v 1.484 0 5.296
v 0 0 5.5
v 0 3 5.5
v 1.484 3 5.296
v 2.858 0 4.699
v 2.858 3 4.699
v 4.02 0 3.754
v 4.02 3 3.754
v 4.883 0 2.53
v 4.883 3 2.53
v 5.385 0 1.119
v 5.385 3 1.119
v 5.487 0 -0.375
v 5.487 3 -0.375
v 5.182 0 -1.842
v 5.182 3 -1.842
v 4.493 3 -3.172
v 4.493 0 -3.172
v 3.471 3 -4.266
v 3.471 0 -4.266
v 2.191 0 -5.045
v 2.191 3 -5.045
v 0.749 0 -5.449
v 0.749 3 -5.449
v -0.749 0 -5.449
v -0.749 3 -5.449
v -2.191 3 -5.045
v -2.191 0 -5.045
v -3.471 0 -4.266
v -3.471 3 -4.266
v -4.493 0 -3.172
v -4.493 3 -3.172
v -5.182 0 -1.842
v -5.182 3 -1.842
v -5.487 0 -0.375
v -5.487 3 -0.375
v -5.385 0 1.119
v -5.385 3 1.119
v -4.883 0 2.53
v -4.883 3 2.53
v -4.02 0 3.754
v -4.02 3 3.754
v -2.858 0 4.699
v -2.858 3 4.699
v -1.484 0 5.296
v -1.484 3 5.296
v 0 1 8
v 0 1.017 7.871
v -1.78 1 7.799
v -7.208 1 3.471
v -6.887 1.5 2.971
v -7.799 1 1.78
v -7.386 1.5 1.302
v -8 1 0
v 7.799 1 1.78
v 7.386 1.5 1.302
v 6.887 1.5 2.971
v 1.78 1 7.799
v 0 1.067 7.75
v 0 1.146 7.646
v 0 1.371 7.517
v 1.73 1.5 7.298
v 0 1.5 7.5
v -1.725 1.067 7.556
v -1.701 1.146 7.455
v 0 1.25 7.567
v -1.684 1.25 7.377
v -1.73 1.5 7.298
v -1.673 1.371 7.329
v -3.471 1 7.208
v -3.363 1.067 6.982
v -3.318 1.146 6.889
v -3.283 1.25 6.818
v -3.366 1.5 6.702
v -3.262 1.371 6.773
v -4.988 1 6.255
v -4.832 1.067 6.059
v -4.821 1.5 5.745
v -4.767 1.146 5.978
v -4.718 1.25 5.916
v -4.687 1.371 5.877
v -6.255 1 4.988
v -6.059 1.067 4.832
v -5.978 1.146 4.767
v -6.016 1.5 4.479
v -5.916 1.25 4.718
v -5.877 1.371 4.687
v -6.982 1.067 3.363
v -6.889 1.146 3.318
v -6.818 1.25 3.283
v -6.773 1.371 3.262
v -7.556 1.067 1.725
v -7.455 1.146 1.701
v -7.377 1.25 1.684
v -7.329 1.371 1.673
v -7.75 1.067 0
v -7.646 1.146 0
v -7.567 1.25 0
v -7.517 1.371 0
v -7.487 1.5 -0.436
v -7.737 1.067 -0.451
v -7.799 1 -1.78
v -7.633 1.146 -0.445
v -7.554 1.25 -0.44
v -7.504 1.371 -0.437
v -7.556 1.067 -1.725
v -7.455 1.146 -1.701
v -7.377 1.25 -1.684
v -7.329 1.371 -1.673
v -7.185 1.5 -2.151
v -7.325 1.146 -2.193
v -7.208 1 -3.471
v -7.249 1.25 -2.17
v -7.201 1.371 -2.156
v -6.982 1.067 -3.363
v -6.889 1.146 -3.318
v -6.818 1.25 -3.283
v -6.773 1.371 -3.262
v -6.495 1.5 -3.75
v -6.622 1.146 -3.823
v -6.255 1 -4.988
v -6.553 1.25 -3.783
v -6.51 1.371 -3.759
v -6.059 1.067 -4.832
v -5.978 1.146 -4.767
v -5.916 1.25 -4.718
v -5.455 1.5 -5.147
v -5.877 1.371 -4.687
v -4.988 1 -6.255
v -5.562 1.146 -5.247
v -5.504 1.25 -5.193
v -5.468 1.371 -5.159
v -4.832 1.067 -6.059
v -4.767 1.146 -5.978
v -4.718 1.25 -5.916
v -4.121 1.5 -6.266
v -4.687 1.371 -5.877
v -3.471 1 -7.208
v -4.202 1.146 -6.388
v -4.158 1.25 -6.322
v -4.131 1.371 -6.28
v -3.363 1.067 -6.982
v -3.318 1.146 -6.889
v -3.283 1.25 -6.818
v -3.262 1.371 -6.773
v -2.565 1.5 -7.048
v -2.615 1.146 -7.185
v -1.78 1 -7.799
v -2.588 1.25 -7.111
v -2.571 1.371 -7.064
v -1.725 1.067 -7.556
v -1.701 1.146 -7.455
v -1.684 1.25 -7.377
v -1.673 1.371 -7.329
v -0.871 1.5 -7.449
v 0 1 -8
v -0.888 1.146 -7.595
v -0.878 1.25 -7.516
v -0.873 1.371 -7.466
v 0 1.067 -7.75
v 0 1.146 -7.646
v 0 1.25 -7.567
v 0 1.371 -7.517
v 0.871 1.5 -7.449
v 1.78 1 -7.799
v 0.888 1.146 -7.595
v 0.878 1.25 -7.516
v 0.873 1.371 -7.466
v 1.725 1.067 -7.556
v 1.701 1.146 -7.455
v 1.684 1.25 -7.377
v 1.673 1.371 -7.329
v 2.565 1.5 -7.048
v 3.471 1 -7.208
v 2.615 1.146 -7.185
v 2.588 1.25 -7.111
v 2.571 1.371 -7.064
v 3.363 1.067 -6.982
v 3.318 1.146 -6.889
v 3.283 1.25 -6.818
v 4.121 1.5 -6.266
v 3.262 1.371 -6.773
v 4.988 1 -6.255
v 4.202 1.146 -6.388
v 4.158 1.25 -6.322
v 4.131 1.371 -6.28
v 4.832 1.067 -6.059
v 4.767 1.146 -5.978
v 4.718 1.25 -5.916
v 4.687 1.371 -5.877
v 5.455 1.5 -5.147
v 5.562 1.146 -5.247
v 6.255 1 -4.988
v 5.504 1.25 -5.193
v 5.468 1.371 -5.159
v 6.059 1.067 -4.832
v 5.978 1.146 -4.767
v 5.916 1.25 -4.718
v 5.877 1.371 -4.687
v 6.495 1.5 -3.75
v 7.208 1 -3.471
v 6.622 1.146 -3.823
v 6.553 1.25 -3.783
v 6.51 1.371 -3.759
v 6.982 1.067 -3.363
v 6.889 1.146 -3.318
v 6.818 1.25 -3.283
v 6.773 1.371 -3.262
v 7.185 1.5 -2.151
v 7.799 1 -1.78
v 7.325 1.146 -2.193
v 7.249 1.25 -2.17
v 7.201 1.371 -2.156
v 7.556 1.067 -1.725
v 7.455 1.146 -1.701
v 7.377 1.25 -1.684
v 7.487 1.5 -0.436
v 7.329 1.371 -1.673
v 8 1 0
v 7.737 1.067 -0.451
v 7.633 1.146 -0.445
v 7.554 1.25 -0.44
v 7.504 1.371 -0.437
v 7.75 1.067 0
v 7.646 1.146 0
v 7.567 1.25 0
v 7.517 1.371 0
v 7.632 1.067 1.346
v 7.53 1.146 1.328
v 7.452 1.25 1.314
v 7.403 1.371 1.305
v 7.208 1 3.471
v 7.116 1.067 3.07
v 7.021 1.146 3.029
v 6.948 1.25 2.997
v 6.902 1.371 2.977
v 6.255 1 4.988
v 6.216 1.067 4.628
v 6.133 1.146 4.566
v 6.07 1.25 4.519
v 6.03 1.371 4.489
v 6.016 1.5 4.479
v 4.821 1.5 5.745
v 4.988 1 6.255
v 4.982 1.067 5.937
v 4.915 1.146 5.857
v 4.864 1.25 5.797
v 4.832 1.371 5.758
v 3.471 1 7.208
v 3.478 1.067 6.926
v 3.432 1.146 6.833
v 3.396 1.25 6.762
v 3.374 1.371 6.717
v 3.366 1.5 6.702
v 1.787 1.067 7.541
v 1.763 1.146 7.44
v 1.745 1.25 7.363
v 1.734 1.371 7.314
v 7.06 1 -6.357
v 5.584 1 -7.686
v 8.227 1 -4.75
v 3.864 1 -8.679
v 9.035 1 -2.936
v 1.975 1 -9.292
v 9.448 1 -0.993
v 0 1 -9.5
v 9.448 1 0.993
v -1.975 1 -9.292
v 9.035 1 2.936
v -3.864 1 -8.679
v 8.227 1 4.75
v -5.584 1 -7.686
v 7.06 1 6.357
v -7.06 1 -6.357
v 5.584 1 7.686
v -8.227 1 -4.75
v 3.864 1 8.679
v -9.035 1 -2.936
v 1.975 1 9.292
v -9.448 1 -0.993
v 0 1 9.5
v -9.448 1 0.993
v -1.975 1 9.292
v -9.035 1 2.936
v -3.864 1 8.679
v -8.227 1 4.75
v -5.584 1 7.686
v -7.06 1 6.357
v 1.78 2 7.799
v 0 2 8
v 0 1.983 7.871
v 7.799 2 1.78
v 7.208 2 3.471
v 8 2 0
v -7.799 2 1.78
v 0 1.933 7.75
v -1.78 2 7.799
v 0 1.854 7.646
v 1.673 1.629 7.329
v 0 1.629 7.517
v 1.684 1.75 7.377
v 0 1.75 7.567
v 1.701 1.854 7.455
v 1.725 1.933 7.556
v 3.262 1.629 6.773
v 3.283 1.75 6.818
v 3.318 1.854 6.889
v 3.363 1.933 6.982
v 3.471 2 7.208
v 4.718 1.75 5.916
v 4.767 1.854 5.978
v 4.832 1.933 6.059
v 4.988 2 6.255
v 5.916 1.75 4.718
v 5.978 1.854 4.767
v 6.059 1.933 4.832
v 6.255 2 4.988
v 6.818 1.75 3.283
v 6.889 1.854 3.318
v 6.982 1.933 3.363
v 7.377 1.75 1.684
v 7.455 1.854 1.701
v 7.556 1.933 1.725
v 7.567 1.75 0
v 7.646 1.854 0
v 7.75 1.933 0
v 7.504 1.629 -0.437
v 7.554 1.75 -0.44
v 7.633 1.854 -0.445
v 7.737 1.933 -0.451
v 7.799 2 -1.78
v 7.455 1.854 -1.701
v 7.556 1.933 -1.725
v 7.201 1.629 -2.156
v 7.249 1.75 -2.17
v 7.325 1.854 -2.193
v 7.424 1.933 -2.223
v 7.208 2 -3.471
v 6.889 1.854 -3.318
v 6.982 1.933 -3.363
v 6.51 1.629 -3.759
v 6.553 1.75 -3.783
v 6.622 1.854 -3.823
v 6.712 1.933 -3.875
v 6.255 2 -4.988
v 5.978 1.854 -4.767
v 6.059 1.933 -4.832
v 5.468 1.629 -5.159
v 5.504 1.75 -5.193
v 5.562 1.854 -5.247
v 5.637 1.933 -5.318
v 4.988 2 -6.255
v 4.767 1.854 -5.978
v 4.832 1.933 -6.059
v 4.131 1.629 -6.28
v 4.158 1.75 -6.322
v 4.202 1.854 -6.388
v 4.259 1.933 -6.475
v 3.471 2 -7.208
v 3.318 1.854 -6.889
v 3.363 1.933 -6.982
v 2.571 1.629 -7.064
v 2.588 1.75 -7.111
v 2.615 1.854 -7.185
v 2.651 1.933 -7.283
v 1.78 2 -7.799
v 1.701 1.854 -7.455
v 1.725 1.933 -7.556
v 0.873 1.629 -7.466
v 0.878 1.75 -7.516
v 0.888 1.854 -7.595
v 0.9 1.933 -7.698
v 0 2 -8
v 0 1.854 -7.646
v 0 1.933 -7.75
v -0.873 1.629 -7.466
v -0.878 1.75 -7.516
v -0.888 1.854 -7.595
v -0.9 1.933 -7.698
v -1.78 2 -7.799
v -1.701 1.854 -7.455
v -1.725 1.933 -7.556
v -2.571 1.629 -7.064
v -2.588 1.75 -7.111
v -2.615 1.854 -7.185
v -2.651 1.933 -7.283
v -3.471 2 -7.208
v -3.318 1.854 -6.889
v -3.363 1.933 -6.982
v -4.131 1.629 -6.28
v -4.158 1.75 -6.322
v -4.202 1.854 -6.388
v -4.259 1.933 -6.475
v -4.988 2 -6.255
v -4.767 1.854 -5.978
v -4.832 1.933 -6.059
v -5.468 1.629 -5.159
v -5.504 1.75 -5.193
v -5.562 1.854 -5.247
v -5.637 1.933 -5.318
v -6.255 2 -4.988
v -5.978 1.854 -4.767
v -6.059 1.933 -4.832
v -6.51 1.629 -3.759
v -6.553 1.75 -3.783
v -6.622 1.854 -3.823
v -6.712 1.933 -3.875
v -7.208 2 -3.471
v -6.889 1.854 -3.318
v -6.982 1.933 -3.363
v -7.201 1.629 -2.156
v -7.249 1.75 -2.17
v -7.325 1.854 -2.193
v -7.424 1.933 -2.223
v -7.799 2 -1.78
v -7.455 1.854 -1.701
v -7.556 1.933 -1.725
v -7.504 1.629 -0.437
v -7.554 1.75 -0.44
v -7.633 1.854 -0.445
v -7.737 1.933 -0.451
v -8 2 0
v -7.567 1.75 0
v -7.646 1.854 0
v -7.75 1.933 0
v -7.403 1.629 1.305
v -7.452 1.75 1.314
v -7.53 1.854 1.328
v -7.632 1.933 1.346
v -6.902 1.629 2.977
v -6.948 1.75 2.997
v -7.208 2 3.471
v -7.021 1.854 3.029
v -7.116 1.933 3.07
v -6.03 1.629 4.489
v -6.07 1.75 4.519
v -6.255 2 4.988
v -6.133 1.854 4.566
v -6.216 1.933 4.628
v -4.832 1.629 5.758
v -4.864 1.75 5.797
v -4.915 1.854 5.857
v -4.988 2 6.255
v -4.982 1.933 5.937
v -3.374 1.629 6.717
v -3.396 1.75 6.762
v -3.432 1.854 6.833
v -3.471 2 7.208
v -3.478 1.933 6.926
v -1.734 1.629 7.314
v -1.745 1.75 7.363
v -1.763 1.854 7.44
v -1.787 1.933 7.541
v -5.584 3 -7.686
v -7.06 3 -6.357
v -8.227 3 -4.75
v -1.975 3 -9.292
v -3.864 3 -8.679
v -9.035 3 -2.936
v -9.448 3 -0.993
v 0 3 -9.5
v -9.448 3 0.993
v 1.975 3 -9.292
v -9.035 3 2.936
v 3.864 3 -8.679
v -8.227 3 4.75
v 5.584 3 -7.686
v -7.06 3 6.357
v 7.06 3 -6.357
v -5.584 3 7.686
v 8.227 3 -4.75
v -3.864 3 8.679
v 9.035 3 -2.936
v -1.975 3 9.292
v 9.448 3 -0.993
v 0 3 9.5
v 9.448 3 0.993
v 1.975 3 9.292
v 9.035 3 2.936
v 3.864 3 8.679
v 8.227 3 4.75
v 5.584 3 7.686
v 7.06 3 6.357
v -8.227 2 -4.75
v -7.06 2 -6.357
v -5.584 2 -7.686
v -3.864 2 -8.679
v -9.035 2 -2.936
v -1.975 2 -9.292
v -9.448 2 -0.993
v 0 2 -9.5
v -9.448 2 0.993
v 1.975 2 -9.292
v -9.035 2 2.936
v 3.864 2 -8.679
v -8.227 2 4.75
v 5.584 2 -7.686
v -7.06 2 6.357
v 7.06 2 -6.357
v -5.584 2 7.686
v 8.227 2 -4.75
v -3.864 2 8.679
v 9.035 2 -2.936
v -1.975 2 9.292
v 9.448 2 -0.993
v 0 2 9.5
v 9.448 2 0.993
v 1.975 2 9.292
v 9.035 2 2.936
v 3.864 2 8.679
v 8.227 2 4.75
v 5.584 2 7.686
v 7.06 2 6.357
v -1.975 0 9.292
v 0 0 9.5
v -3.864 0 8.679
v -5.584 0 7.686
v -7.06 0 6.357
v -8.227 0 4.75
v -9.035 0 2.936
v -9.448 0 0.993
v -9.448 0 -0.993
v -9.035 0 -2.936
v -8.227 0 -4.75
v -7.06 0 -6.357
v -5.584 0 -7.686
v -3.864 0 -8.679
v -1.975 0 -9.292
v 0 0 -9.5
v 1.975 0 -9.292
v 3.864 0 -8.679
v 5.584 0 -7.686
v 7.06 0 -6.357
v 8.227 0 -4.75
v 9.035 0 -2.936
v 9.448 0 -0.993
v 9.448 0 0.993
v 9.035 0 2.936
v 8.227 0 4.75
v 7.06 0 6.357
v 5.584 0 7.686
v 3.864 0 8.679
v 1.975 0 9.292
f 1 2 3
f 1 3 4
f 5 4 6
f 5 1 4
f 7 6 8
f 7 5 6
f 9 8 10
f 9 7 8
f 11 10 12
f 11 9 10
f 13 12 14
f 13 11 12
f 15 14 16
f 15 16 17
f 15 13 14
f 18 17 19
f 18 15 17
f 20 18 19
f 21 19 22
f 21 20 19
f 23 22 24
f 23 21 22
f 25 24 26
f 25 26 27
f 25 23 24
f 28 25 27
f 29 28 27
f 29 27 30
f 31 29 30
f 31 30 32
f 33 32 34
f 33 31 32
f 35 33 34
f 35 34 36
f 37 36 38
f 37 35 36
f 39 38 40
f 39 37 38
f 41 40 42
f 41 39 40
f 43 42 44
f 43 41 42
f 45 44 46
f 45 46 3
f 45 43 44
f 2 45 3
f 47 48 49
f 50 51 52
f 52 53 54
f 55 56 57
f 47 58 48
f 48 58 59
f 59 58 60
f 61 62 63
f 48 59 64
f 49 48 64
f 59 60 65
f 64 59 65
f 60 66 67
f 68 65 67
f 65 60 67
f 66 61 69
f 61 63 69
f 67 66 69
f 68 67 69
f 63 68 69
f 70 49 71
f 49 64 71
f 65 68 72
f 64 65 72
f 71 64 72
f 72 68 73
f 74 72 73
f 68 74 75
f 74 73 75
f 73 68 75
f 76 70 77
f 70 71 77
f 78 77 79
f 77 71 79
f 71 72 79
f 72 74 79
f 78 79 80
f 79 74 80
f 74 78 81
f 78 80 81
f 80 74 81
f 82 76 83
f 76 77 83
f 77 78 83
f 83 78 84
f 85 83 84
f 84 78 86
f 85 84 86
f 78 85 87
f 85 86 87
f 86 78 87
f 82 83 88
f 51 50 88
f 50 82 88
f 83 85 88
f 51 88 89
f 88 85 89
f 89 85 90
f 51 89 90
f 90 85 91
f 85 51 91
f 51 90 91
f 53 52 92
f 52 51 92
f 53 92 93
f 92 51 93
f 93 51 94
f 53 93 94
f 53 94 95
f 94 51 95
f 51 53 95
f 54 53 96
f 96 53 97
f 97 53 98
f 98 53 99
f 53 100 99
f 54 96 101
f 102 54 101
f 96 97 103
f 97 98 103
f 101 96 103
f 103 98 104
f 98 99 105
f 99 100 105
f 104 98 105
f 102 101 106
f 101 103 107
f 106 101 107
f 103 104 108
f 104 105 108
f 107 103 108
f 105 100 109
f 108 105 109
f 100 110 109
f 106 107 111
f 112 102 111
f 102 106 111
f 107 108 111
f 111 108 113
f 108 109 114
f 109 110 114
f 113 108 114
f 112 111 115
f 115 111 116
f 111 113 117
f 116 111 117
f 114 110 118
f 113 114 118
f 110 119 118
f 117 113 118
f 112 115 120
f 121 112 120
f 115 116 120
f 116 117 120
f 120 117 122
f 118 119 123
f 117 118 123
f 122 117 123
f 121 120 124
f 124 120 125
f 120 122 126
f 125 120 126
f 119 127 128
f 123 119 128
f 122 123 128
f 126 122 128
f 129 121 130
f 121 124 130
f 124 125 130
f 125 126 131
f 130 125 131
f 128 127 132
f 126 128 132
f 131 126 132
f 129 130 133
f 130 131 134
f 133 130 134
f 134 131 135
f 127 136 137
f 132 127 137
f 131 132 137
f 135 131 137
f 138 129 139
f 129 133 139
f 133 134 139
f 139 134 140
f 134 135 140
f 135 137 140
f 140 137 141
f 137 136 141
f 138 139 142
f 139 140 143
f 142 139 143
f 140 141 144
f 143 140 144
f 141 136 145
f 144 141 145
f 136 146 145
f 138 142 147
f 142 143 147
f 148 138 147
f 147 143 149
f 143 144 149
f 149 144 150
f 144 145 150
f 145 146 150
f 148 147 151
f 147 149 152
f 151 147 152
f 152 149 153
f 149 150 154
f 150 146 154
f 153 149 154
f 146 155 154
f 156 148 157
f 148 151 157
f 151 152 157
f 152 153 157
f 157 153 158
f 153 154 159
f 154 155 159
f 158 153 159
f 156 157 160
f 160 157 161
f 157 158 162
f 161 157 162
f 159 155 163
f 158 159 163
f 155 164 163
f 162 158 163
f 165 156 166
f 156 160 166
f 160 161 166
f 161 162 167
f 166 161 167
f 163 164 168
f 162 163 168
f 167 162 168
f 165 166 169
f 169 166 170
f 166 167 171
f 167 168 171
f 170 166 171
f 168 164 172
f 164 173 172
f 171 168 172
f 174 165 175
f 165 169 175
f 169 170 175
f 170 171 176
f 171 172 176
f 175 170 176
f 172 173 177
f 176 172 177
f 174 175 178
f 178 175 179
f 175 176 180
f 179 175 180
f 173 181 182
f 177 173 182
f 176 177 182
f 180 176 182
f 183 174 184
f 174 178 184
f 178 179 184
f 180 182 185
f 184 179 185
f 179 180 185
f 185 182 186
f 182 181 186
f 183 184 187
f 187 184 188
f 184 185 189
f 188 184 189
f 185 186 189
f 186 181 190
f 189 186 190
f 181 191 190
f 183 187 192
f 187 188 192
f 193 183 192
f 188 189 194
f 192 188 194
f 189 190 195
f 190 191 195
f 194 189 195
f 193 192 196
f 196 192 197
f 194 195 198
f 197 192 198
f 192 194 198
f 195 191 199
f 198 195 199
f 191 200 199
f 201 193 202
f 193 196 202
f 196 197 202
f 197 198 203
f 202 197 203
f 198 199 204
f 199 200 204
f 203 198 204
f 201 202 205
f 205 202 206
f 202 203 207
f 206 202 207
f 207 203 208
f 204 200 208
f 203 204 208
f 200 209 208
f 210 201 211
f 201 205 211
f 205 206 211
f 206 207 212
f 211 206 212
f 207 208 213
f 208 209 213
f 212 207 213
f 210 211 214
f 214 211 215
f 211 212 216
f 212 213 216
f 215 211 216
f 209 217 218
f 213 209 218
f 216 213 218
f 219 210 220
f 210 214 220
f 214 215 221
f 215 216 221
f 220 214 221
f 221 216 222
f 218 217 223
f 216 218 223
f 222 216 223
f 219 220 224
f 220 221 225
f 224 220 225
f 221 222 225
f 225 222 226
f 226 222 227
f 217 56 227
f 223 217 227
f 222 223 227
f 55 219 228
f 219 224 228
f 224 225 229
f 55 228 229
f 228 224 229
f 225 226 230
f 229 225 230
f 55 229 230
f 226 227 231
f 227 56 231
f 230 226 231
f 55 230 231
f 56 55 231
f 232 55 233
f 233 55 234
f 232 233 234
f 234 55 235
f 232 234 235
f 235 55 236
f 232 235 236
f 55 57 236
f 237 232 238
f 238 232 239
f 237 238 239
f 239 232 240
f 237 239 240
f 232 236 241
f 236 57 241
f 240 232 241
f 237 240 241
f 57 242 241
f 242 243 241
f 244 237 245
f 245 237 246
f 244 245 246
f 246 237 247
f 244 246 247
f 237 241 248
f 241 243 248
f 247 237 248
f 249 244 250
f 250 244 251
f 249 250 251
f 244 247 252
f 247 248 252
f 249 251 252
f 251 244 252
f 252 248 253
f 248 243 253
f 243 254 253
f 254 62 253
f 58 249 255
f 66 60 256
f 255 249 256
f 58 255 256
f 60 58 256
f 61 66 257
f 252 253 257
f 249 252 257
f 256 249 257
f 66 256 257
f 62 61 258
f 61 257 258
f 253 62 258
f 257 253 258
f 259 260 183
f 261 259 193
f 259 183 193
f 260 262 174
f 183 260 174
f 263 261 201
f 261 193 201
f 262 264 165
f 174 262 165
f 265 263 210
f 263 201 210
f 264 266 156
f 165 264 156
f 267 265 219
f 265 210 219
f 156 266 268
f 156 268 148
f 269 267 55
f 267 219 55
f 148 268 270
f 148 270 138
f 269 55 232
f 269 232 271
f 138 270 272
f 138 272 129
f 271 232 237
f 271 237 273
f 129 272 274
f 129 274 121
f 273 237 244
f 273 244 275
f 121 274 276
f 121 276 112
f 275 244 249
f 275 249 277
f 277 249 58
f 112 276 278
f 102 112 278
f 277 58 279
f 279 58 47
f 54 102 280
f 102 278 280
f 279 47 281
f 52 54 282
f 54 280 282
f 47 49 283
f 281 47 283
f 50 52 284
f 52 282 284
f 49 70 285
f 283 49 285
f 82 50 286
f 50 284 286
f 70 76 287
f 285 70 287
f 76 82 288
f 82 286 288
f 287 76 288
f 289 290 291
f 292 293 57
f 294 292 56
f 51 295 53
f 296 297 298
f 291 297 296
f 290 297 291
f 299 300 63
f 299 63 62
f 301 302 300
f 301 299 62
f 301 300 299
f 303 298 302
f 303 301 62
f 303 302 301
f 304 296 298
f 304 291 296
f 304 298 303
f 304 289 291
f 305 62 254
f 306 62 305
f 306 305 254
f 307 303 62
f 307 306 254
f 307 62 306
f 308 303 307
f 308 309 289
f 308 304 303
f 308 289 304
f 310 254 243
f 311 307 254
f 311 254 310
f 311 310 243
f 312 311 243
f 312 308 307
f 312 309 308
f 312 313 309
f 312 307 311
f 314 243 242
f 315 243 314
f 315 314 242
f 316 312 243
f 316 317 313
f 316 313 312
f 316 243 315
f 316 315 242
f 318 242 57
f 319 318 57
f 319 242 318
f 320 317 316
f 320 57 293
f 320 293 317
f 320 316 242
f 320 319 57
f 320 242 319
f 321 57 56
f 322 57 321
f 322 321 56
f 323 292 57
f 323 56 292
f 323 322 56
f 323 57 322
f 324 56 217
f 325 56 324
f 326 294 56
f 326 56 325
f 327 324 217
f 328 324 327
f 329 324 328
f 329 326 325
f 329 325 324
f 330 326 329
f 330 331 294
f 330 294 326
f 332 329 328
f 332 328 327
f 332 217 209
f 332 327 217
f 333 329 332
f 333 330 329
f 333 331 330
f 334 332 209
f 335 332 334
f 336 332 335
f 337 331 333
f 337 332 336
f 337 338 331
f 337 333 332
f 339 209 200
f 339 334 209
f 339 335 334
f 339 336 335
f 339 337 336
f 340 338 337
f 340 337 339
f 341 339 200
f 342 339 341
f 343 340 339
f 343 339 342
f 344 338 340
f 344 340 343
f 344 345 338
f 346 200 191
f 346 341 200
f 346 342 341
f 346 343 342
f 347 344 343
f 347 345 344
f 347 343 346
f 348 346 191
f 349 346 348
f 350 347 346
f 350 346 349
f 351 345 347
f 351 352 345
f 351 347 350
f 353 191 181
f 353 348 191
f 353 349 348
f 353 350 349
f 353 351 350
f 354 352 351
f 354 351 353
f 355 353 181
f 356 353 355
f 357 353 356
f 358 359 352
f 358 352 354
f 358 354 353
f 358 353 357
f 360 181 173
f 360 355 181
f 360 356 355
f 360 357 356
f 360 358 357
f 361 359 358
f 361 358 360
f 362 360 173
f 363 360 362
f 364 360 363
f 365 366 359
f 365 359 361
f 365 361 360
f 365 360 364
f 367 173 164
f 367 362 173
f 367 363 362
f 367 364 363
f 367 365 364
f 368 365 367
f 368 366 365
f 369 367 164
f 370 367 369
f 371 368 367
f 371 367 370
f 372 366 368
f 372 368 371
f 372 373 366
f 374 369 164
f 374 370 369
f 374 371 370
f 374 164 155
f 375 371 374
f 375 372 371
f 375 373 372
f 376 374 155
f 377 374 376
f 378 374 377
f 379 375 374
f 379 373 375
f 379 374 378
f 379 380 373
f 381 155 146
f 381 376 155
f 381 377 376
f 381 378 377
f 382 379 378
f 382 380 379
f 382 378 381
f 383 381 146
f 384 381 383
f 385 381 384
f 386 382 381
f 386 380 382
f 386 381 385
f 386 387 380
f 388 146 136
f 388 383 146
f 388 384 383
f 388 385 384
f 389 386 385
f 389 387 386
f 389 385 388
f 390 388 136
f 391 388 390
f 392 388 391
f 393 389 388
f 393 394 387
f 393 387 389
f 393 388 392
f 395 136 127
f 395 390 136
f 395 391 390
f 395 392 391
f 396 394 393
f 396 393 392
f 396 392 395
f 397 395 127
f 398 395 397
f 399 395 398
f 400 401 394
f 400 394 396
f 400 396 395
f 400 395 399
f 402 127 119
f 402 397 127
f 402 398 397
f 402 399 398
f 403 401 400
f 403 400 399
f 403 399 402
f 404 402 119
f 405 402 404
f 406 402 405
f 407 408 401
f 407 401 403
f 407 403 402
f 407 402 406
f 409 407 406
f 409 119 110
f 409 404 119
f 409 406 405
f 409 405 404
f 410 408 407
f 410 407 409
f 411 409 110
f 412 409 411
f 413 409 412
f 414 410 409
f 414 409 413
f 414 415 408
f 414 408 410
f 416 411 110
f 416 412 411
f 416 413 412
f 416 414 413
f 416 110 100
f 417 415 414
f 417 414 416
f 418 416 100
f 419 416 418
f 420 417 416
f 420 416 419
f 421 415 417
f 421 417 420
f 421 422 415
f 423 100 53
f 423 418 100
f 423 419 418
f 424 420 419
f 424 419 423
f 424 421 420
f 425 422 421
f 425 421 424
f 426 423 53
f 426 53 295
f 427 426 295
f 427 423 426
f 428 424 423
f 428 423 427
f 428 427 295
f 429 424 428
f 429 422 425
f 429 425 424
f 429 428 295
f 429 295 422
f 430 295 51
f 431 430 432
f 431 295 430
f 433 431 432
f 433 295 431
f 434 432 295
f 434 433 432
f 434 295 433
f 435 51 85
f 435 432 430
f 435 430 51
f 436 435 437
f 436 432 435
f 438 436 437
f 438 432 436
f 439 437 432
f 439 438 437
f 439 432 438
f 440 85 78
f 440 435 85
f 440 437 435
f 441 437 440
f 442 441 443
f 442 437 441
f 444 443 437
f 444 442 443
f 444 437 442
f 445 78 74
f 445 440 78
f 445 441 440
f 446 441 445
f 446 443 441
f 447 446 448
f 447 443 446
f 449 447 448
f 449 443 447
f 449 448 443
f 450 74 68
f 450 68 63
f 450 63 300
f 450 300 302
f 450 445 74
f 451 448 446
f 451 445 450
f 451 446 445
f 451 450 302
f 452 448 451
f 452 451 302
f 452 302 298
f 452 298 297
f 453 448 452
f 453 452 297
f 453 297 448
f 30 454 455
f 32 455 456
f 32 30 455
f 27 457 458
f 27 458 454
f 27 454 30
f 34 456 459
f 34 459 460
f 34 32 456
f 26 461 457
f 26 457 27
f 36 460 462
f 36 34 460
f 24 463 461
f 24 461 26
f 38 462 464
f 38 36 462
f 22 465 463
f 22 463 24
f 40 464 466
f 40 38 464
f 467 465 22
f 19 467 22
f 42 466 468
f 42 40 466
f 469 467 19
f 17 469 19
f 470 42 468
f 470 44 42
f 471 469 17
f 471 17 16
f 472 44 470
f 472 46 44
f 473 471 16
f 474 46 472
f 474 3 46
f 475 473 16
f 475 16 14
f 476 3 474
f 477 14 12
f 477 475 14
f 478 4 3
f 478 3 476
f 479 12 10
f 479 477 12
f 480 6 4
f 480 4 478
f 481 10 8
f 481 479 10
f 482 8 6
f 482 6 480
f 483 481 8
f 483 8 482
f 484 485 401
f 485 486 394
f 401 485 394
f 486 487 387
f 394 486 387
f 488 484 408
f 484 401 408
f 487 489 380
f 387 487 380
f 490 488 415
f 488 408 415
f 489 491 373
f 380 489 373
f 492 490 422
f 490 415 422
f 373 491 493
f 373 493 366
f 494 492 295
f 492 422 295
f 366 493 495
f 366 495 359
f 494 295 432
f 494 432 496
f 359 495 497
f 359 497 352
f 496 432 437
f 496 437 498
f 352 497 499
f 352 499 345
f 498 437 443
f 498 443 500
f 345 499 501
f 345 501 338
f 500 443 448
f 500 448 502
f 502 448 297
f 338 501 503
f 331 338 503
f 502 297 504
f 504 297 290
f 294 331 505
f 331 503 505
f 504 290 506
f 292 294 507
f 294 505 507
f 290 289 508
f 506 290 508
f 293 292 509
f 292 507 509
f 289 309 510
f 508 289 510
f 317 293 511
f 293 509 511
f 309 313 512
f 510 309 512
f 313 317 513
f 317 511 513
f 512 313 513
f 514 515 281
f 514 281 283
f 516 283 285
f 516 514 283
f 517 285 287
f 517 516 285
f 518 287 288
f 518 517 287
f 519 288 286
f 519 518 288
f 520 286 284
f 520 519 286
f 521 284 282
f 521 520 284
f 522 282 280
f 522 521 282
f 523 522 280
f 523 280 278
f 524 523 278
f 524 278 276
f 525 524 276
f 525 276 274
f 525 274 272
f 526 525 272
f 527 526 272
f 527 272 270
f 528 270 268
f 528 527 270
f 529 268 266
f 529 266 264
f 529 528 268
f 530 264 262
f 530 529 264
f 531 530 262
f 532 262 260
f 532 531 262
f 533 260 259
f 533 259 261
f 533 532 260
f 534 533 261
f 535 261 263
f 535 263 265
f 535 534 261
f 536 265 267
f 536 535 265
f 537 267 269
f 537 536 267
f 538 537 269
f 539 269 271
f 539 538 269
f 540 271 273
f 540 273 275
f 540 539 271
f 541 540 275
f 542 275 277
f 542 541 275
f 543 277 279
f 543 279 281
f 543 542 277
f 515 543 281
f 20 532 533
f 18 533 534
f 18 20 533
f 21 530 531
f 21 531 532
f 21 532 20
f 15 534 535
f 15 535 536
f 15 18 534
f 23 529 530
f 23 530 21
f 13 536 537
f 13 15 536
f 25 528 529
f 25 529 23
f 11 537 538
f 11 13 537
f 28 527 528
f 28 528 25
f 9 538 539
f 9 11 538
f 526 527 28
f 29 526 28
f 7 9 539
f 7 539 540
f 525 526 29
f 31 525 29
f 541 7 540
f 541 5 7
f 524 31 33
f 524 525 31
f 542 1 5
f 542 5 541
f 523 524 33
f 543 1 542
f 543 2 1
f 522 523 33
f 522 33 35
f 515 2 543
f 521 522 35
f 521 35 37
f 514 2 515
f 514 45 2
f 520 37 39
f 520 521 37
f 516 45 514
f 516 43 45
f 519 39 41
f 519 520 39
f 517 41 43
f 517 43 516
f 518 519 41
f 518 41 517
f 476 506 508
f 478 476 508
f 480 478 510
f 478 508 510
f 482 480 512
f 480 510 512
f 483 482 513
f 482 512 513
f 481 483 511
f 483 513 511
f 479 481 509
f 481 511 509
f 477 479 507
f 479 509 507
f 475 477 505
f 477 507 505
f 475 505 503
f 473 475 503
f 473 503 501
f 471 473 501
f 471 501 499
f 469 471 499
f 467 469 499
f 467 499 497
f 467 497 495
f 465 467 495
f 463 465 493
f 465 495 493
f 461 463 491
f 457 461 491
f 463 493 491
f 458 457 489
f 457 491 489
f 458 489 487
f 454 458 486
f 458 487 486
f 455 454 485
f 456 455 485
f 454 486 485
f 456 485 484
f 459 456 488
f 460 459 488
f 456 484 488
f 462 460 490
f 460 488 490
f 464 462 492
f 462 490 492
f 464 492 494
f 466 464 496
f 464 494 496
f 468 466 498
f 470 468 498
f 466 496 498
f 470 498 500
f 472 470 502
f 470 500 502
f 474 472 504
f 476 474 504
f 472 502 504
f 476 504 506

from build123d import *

# Parameters (mm, degrees)
SKETCH1_R           = 7.5
SKETCH1_R_2         = 5.5
BOSS_EXTRUDE1_DEPTH = 3
BOSS_EXTRUDE2_START = -1
SKETCH2_R           = 9.5
SKETCH2_R_2         = 7.5
BOSS_EXTRUDE2_DEPTH = 1
SKETCH3_R           = 9.5
SKETCH3_R_2         = 7.5
BOSS_EXTRUDE3_DEPTH = 1
FILLET1_R           = 0.5


with BuildPart() as part:
    # Sketch1 → Boss-Extrude1 (new body)
    with BuildSketch(Plane(origin=(0, 0, 0), x_dir=(1, 0, 0), z_dir=(0, 1, 0))):
        with Locations(Location((0, 0, 0), (0, 0, 270))):
            Circle(SKETCH1_R)
        with Locations(Location((0, 0, 0), (0, 0, 270))):
            Circle(SKETCH1_R_2, mode=Mode.SUBTRACT)
    extrude(amount=BOSS_EXTRUDE1_DEPTH)

    # Sketch2 → Boss-Extrude2 (add)
    with BuildSketch(Plane(origin=(0, 3, 0), x_dir=(1, 0, 0), z_dir=(0, 1, 0)).offset(BOSS_EXTRUDE2_START)):
        with Locations(Location((0, 0, 0), (0, 0, 270))):
            Circle(SKETCH2_R)
        with Locations(Location((0, 0, 0), (0, 0, 270))):
            Circle(SKETCH2_R_2, mode=Mode.SUBTRACT)
    extrude(amount=BOSS_EXTRUDE2_DEPTH)

    # Sketch3 → Boss-Extrude3 (add)
    with BuildSketch(Plane.XZ):
        with Locations(Location((0, 0, 0), (0, 0, 90))):
            Circle(SKETCH3_R)
        with Locations(Location((0, 0, 0), (0, 0, 270))):
            Circle(SKETCH3_R_2, mode=Mode.SUBTRACT)
    extrude(amount=-BOSS_EXTRUDE3_DEPTH)

    # Fillet1
    fillet1_edges = [part.edges().sort_by_distance(p)[0] for p in [
        (0, 2, -7.5),
        (0, 1, -7.5),
    ]]
    fillet(fillet1_edges, radius=FILLET1_R - 0.0001)  # a hair under: the kernel refuses the full size


solid = part.part
